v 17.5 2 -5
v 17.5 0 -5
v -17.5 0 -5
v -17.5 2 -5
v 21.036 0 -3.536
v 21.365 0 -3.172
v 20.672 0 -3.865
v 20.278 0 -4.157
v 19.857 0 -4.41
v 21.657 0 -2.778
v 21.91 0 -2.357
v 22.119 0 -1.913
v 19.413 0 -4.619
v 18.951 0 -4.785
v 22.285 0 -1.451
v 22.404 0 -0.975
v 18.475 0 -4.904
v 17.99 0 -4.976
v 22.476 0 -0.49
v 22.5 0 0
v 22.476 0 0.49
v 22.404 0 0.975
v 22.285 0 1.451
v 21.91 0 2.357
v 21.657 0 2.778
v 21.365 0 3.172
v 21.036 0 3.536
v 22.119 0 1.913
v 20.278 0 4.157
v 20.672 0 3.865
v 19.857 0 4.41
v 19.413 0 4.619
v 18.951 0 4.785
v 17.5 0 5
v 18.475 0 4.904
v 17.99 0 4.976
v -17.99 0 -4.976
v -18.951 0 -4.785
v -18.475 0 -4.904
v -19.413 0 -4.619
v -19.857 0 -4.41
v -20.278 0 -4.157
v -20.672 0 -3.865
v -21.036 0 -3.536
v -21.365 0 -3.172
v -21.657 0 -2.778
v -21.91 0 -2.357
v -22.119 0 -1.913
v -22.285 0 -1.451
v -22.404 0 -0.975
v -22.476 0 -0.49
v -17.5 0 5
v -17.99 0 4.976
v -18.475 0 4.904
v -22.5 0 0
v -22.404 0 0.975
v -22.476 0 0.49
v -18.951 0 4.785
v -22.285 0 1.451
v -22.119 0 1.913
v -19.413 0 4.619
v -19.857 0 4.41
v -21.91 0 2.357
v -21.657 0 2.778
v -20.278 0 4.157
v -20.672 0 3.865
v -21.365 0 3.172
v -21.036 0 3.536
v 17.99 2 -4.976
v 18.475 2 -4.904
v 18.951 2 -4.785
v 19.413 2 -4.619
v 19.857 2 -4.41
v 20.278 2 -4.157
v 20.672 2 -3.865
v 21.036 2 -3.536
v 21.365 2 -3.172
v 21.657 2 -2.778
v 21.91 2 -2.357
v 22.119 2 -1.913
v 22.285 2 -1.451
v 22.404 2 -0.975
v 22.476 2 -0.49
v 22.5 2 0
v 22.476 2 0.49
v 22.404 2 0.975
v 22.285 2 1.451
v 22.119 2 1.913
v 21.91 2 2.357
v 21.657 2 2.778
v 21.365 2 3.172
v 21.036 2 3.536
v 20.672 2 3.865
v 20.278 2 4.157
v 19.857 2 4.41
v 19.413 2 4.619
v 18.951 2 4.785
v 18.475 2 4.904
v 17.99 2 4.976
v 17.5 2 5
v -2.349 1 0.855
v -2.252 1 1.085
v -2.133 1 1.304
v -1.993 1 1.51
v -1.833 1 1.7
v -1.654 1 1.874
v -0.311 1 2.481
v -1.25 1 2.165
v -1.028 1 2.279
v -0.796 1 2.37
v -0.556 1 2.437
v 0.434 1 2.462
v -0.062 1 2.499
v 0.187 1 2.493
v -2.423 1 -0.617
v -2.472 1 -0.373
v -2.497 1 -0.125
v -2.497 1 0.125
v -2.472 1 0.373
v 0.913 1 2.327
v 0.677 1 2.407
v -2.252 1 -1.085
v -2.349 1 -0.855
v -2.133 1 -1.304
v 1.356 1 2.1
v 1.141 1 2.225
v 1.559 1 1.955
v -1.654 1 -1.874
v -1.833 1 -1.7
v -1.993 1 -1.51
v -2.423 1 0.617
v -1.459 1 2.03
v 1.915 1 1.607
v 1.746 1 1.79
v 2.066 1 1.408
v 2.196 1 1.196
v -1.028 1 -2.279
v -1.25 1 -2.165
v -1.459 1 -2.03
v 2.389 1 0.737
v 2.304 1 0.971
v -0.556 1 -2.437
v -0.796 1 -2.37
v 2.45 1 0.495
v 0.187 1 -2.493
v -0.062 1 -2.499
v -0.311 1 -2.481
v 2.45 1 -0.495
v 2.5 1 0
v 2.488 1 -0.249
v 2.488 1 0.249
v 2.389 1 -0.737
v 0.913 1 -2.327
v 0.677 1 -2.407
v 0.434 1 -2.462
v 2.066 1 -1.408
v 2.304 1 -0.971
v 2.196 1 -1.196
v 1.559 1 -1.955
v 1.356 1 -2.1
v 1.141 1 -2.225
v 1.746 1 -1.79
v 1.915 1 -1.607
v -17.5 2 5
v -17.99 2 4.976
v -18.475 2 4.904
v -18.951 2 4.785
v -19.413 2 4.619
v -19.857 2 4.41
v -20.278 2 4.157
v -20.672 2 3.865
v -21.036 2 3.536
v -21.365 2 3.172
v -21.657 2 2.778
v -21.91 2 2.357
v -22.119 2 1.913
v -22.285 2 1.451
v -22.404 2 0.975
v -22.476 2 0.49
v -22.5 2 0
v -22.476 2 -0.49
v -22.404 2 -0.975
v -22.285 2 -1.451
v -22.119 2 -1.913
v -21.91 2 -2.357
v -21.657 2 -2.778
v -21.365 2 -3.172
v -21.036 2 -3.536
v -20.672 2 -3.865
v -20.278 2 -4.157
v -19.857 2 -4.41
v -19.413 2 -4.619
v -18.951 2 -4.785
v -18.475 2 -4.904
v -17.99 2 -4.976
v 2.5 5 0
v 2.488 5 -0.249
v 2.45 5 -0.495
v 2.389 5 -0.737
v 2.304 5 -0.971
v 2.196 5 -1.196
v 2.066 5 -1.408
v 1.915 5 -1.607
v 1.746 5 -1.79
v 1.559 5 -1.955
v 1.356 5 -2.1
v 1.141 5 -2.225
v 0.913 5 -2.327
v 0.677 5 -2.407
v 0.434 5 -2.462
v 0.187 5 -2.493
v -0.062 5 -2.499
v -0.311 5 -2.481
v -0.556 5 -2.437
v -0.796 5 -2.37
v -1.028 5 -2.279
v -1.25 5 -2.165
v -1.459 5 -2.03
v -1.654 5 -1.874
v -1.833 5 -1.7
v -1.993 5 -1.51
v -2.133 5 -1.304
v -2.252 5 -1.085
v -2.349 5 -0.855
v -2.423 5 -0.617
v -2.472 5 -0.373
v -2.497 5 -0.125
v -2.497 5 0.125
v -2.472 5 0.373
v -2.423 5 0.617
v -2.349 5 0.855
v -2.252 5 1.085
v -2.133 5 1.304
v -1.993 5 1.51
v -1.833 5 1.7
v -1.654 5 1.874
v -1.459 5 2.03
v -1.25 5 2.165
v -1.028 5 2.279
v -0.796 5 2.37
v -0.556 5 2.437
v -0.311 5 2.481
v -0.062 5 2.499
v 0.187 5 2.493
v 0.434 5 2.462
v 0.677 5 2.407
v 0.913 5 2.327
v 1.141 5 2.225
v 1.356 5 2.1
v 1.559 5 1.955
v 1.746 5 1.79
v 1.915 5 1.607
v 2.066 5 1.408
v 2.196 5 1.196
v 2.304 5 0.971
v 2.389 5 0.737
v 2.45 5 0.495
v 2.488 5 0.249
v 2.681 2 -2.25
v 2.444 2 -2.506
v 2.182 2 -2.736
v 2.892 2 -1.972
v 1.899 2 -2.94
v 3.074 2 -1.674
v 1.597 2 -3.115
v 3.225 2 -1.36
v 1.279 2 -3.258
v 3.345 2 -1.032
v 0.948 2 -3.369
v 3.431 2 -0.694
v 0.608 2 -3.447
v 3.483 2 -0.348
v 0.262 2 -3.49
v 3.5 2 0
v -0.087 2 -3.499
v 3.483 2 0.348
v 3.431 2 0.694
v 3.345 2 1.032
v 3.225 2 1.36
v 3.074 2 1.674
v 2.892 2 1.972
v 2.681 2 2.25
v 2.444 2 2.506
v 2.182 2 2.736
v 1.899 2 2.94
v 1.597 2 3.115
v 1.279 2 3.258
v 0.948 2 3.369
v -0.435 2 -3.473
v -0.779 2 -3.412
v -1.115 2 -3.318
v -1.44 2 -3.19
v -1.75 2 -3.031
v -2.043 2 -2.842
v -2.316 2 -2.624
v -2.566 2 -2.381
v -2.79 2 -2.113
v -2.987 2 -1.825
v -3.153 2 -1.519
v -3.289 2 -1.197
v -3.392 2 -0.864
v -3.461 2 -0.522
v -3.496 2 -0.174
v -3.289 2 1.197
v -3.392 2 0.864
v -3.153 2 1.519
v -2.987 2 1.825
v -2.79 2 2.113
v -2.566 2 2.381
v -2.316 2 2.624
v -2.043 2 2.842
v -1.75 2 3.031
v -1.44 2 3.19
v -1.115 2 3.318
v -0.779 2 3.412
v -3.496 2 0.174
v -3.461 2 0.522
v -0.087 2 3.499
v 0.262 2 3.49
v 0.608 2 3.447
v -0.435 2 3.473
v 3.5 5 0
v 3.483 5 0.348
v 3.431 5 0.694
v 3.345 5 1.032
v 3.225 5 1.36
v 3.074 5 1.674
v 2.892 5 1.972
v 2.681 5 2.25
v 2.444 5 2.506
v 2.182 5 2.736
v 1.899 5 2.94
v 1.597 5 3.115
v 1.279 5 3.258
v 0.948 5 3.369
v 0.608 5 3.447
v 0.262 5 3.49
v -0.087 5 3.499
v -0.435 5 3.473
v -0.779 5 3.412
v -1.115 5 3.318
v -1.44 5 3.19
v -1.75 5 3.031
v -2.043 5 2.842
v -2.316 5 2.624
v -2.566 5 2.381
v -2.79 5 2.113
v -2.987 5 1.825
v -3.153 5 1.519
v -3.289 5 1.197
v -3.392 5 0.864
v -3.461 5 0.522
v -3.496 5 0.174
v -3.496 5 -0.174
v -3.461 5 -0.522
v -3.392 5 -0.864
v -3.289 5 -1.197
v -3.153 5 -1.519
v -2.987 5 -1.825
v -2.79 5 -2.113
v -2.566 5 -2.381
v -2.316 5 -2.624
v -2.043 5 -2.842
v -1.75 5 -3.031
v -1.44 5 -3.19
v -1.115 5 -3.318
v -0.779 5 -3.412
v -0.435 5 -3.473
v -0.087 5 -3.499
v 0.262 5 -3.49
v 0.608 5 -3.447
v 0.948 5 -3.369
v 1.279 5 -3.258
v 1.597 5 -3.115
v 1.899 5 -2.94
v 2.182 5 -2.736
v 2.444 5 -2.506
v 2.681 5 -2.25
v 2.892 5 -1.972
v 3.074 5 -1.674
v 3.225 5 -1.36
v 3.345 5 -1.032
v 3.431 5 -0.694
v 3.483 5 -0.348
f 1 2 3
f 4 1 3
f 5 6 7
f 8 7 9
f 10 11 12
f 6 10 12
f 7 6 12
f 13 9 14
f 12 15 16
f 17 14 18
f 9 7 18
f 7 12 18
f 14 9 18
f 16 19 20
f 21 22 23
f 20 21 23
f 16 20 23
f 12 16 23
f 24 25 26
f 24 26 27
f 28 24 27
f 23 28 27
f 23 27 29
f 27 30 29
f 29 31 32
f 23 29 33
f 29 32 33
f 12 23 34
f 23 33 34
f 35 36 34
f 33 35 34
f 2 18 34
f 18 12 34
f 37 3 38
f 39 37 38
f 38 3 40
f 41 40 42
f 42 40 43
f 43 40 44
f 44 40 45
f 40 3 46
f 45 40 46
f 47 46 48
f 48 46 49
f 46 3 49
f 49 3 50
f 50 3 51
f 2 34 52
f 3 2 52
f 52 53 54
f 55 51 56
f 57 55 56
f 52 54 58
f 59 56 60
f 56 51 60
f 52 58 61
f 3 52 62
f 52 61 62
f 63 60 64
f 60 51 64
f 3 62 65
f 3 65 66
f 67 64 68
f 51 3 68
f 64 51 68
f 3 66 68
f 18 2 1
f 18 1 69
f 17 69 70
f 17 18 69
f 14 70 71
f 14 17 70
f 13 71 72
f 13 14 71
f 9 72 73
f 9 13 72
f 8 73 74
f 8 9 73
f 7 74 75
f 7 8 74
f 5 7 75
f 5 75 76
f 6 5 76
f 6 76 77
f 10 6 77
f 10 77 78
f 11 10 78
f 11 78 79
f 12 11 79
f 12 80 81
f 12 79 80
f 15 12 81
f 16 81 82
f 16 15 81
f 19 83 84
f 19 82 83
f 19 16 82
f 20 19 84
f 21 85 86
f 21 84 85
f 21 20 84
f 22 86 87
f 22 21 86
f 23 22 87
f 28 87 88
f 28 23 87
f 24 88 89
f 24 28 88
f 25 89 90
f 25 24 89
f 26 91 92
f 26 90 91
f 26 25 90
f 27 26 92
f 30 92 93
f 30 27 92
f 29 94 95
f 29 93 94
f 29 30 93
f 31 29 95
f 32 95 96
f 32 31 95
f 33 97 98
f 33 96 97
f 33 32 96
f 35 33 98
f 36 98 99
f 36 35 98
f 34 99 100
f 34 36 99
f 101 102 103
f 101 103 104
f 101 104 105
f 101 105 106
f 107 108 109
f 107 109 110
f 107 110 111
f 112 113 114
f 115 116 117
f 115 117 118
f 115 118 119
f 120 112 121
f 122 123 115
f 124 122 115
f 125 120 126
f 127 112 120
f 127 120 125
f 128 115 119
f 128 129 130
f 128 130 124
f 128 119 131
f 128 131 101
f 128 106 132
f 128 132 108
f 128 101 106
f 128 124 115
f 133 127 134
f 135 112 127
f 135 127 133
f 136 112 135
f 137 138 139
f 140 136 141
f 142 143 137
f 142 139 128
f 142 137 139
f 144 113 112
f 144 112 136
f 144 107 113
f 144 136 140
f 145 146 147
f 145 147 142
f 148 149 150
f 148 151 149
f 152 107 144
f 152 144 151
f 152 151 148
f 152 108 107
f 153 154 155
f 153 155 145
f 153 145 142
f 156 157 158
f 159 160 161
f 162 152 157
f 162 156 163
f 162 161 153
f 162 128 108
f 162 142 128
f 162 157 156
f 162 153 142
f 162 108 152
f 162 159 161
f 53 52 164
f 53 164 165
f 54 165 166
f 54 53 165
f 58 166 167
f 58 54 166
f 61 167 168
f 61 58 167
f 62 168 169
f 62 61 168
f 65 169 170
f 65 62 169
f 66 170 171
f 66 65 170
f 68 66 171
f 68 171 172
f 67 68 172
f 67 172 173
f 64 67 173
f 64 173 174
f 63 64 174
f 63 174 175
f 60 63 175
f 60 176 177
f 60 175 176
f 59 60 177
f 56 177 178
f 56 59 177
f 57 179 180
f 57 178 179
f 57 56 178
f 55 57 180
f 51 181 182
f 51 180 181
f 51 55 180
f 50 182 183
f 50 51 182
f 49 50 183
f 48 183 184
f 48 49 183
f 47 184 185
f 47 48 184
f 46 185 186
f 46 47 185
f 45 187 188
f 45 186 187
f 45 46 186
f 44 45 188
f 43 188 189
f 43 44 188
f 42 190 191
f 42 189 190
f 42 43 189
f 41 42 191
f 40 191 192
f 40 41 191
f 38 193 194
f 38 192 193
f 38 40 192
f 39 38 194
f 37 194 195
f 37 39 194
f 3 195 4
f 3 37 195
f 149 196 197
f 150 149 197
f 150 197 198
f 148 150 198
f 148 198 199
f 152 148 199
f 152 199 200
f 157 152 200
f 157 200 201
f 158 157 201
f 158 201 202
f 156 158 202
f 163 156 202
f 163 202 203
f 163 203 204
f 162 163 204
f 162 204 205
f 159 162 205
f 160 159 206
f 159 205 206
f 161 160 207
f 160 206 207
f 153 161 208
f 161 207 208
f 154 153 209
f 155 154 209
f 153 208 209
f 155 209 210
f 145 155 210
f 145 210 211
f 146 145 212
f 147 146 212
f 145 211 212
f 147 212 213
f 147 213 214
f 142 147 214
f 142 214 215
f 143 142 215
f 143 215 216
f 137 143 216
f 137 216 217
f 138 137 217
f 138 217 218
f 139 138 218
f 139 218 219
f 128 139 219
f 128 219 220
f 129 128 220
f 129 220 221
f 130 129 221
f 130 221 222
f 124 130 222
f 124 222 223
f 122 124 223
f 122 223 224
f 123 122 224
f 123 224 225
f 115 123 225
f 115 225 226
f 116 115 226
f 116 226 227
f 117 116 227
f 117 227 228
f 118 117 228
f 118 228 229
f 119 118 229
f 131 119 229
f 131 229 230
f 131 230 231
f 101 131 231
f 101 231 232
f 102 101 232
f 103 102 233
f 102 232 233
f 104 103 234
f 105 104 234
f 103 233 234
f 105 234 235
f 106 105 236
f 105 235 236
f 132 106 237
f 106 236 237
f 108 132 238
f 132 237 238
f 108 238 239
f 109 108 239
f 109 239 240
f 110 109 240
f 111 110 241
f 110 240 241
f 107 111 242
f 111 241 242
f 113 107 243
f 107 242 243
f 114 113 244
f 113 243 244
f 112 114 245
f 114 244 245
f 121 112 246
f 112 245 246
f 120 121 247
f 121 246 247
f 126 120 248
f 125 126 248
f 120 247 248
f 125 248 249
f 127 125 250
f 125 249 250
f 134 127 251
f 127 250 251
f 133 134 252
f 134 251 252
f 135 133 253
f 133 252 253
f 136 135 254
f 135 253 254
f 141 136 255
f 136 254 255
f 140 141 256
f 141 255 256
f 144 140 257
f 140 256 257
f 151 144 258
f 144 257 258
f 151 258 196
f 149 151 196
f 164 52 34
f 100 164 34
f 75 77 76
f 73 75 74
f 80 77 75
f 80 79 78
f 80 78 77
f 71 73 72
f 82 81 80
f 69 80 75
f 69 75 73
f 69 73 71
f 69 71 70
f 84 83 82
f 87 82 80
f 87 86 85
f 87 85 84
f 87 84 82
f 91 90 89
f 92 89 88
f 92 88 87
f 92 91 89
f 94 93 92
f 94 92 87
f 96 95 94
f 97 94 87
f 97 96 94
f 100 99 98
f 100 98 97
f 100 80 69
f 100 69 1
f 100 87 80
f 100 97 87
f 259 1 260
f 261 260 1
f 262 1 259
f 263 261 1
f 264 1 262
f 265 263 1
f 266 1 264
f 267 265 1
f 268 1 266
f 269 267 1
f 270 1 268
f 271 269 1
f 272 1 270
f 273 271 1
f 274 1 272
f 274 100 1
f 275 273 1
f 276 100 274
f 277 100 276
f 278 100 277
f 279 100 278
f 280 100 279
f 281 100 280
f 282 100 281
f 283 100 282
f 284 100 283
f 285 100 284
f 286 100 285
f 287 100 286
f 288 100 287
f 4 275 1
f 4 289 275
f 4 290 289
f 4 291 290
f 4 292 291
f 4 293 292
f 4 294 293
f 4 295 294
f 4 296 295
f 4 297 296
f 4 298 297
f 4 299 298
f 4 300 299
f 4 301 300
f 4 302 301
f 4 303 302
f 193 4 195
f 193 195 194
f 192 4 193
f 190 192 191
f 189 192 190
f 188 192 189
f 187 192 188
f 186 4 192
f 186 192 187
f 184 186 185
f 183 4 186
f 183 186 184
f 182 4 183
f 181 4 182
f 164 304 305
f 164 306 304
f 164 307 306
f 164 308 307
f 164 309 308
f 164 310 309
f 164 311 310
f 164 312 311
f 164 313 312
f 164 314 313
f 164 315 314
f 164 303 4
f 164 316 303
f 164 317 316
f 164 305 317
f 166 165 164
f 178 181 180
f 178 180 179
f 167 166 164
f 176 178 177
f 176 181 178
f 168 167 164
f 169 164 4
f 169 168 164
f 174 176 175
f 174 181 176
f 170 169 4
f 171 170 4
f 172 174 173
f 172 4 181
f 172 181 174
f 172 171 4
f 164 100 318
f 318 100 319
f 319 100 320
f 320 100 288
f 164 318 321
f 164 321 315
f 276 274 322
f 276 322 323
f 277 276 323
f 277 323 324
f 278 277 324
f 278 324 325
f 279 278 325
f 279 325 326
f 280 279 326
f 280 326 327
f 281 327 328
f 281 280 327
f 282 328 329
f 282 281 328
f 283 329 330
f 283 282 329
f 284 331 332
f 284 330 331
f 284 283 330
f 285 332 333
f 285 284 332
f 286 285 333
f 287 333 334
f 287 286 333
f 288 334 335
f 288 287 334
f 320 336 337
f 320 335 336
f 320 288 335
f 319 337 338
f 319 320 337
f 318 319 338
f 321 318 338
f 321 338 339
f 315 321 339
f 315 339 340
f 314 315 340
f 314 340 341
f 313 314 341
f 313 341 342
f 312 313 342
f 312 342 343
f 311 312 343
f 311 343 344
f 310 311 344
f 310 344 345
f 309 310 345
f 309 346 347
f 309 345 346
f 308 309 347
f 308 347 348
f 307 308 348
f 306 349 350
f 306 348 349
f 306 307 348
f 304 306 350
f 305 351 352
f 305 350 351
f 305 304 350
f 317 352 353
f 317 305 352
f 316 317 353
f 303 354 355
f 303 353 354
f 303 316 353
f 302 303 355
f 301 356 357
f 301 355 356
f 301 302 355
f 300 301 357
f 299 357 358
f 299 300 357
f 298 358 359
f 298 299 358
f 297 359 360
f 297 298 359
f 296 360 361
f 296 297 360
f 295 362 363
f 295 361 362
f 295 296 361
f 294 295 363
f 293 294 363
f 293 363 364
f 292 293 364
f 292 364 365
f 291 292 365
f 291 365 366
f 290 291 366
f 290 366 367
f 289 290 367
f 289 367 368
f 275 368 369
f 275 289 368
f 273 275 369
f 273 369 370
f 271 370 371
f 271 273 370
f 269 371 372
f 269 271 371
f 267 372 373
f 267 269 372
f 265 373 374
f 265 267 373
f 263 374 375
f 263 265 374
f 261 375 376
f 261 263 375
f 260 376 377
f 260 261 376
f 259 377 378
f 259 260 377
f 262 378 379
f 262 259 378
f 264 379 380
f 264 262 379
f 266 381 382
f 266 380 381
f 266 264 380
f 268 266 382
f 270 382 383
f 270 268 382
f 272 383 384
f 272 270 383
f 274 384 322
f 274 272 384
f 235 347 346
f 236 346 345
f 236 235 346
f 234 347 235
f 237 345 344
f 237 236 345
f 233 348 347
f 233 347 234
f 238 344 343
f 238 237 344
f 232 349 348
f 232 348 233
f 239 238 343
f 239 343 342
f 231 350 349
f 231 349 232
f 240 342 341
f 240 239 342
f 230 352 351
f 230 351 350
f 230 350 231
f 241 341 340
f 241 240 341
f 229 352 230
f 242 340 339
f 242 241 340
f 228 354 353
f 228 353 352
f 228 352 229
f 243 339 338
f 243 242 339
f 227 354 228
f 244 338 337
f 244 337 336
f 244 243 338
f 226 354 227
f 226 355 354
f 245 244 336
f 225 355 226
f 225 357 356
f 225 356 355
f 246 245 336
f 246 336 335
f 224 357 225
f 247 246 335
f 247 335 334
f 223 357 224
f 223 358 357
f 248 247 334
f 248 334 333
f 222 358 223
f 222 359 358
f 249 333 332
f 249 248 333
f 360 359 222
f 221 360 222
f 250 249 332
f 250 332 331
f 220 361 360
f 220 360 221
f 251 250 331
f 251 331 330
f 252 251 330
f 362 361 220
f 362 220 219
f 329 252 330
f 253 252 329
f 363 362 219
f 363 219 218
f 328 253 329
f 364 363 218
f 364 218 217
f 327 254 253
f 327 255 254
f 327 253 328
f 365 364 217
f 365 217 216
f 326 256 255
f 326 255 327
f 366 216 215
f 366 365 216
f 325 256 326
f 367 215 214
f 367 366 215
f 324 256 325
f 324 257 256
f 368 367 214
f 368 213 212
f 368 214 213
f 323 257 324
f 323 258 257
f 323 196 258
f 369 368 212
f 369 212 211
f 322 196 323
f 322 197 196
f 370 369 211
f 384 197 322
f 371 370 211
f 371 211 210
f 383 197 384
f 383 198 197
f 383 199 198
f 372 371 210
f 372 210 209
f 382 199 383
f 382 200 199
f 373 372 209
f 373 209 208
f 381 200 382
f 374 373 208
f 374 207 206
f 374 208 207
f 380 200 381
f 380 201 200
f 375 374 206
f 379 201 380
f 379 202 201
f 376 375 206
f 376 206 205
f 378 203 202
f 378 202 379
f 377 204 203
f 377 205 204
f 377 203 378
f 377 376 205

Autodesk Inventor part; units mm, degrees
ref_plane "YZ Plane" through (0, 0, 0) normal (1, 0, 0) x (0, 1, 0)
ref_plane "XZ Plane" through (0, 0, 0) normal (0, 1, 0) x (-1, 0, 0)
ref_plane "XY Plane" through (0, 0, 0) normal (0, 0, 1) x (1, 0, 0)
sketch "Sketch1" plane through (0, 0, 0) normal (0, 1, 0) x (-1, 0, 0)
  line L0 (17.5, 0) -> (-17.5, 0) construction
  line L1 (17.5, 5) -> (-17.5, 5)
  line L2 (-17.5, -5) -> (17.5, -5)
  arc A0 (17.5, -5) -> (17.5, 5) centre (17.5, 0) ccw
  arc A1 (-17.5, 5) -> (-17.5, -5) centre (-17.5, 0) ccw
  point P0 (0, 0)
  dimension "d0" = 17.5
  dimension "d1" = 10
extrude "Extrusion1" add sketch "Sketch1" along normal blind 2
sketch "Sketch2" plane through (0, 2, 0) normal (0, 1, 0) x (1, 0, 0)
  circle A0 centre (0, 0) radius 3.5
  dimension "d4" = 7
extrude "Extrusion2" add sketch "Sketch2" along normal blind 3
sketch "Sketch3" plane through (0, 5, 0) normal (0, 1, 0) x (1, 0, 0)
  circle A0 centre (0, 0) radius 2.5
  point P0 (0, 0)
  dimension "d7" = 5
extrude "Extrusion3" cut sketch "Sketch3" against normal blind 4
properties part number "tang"
